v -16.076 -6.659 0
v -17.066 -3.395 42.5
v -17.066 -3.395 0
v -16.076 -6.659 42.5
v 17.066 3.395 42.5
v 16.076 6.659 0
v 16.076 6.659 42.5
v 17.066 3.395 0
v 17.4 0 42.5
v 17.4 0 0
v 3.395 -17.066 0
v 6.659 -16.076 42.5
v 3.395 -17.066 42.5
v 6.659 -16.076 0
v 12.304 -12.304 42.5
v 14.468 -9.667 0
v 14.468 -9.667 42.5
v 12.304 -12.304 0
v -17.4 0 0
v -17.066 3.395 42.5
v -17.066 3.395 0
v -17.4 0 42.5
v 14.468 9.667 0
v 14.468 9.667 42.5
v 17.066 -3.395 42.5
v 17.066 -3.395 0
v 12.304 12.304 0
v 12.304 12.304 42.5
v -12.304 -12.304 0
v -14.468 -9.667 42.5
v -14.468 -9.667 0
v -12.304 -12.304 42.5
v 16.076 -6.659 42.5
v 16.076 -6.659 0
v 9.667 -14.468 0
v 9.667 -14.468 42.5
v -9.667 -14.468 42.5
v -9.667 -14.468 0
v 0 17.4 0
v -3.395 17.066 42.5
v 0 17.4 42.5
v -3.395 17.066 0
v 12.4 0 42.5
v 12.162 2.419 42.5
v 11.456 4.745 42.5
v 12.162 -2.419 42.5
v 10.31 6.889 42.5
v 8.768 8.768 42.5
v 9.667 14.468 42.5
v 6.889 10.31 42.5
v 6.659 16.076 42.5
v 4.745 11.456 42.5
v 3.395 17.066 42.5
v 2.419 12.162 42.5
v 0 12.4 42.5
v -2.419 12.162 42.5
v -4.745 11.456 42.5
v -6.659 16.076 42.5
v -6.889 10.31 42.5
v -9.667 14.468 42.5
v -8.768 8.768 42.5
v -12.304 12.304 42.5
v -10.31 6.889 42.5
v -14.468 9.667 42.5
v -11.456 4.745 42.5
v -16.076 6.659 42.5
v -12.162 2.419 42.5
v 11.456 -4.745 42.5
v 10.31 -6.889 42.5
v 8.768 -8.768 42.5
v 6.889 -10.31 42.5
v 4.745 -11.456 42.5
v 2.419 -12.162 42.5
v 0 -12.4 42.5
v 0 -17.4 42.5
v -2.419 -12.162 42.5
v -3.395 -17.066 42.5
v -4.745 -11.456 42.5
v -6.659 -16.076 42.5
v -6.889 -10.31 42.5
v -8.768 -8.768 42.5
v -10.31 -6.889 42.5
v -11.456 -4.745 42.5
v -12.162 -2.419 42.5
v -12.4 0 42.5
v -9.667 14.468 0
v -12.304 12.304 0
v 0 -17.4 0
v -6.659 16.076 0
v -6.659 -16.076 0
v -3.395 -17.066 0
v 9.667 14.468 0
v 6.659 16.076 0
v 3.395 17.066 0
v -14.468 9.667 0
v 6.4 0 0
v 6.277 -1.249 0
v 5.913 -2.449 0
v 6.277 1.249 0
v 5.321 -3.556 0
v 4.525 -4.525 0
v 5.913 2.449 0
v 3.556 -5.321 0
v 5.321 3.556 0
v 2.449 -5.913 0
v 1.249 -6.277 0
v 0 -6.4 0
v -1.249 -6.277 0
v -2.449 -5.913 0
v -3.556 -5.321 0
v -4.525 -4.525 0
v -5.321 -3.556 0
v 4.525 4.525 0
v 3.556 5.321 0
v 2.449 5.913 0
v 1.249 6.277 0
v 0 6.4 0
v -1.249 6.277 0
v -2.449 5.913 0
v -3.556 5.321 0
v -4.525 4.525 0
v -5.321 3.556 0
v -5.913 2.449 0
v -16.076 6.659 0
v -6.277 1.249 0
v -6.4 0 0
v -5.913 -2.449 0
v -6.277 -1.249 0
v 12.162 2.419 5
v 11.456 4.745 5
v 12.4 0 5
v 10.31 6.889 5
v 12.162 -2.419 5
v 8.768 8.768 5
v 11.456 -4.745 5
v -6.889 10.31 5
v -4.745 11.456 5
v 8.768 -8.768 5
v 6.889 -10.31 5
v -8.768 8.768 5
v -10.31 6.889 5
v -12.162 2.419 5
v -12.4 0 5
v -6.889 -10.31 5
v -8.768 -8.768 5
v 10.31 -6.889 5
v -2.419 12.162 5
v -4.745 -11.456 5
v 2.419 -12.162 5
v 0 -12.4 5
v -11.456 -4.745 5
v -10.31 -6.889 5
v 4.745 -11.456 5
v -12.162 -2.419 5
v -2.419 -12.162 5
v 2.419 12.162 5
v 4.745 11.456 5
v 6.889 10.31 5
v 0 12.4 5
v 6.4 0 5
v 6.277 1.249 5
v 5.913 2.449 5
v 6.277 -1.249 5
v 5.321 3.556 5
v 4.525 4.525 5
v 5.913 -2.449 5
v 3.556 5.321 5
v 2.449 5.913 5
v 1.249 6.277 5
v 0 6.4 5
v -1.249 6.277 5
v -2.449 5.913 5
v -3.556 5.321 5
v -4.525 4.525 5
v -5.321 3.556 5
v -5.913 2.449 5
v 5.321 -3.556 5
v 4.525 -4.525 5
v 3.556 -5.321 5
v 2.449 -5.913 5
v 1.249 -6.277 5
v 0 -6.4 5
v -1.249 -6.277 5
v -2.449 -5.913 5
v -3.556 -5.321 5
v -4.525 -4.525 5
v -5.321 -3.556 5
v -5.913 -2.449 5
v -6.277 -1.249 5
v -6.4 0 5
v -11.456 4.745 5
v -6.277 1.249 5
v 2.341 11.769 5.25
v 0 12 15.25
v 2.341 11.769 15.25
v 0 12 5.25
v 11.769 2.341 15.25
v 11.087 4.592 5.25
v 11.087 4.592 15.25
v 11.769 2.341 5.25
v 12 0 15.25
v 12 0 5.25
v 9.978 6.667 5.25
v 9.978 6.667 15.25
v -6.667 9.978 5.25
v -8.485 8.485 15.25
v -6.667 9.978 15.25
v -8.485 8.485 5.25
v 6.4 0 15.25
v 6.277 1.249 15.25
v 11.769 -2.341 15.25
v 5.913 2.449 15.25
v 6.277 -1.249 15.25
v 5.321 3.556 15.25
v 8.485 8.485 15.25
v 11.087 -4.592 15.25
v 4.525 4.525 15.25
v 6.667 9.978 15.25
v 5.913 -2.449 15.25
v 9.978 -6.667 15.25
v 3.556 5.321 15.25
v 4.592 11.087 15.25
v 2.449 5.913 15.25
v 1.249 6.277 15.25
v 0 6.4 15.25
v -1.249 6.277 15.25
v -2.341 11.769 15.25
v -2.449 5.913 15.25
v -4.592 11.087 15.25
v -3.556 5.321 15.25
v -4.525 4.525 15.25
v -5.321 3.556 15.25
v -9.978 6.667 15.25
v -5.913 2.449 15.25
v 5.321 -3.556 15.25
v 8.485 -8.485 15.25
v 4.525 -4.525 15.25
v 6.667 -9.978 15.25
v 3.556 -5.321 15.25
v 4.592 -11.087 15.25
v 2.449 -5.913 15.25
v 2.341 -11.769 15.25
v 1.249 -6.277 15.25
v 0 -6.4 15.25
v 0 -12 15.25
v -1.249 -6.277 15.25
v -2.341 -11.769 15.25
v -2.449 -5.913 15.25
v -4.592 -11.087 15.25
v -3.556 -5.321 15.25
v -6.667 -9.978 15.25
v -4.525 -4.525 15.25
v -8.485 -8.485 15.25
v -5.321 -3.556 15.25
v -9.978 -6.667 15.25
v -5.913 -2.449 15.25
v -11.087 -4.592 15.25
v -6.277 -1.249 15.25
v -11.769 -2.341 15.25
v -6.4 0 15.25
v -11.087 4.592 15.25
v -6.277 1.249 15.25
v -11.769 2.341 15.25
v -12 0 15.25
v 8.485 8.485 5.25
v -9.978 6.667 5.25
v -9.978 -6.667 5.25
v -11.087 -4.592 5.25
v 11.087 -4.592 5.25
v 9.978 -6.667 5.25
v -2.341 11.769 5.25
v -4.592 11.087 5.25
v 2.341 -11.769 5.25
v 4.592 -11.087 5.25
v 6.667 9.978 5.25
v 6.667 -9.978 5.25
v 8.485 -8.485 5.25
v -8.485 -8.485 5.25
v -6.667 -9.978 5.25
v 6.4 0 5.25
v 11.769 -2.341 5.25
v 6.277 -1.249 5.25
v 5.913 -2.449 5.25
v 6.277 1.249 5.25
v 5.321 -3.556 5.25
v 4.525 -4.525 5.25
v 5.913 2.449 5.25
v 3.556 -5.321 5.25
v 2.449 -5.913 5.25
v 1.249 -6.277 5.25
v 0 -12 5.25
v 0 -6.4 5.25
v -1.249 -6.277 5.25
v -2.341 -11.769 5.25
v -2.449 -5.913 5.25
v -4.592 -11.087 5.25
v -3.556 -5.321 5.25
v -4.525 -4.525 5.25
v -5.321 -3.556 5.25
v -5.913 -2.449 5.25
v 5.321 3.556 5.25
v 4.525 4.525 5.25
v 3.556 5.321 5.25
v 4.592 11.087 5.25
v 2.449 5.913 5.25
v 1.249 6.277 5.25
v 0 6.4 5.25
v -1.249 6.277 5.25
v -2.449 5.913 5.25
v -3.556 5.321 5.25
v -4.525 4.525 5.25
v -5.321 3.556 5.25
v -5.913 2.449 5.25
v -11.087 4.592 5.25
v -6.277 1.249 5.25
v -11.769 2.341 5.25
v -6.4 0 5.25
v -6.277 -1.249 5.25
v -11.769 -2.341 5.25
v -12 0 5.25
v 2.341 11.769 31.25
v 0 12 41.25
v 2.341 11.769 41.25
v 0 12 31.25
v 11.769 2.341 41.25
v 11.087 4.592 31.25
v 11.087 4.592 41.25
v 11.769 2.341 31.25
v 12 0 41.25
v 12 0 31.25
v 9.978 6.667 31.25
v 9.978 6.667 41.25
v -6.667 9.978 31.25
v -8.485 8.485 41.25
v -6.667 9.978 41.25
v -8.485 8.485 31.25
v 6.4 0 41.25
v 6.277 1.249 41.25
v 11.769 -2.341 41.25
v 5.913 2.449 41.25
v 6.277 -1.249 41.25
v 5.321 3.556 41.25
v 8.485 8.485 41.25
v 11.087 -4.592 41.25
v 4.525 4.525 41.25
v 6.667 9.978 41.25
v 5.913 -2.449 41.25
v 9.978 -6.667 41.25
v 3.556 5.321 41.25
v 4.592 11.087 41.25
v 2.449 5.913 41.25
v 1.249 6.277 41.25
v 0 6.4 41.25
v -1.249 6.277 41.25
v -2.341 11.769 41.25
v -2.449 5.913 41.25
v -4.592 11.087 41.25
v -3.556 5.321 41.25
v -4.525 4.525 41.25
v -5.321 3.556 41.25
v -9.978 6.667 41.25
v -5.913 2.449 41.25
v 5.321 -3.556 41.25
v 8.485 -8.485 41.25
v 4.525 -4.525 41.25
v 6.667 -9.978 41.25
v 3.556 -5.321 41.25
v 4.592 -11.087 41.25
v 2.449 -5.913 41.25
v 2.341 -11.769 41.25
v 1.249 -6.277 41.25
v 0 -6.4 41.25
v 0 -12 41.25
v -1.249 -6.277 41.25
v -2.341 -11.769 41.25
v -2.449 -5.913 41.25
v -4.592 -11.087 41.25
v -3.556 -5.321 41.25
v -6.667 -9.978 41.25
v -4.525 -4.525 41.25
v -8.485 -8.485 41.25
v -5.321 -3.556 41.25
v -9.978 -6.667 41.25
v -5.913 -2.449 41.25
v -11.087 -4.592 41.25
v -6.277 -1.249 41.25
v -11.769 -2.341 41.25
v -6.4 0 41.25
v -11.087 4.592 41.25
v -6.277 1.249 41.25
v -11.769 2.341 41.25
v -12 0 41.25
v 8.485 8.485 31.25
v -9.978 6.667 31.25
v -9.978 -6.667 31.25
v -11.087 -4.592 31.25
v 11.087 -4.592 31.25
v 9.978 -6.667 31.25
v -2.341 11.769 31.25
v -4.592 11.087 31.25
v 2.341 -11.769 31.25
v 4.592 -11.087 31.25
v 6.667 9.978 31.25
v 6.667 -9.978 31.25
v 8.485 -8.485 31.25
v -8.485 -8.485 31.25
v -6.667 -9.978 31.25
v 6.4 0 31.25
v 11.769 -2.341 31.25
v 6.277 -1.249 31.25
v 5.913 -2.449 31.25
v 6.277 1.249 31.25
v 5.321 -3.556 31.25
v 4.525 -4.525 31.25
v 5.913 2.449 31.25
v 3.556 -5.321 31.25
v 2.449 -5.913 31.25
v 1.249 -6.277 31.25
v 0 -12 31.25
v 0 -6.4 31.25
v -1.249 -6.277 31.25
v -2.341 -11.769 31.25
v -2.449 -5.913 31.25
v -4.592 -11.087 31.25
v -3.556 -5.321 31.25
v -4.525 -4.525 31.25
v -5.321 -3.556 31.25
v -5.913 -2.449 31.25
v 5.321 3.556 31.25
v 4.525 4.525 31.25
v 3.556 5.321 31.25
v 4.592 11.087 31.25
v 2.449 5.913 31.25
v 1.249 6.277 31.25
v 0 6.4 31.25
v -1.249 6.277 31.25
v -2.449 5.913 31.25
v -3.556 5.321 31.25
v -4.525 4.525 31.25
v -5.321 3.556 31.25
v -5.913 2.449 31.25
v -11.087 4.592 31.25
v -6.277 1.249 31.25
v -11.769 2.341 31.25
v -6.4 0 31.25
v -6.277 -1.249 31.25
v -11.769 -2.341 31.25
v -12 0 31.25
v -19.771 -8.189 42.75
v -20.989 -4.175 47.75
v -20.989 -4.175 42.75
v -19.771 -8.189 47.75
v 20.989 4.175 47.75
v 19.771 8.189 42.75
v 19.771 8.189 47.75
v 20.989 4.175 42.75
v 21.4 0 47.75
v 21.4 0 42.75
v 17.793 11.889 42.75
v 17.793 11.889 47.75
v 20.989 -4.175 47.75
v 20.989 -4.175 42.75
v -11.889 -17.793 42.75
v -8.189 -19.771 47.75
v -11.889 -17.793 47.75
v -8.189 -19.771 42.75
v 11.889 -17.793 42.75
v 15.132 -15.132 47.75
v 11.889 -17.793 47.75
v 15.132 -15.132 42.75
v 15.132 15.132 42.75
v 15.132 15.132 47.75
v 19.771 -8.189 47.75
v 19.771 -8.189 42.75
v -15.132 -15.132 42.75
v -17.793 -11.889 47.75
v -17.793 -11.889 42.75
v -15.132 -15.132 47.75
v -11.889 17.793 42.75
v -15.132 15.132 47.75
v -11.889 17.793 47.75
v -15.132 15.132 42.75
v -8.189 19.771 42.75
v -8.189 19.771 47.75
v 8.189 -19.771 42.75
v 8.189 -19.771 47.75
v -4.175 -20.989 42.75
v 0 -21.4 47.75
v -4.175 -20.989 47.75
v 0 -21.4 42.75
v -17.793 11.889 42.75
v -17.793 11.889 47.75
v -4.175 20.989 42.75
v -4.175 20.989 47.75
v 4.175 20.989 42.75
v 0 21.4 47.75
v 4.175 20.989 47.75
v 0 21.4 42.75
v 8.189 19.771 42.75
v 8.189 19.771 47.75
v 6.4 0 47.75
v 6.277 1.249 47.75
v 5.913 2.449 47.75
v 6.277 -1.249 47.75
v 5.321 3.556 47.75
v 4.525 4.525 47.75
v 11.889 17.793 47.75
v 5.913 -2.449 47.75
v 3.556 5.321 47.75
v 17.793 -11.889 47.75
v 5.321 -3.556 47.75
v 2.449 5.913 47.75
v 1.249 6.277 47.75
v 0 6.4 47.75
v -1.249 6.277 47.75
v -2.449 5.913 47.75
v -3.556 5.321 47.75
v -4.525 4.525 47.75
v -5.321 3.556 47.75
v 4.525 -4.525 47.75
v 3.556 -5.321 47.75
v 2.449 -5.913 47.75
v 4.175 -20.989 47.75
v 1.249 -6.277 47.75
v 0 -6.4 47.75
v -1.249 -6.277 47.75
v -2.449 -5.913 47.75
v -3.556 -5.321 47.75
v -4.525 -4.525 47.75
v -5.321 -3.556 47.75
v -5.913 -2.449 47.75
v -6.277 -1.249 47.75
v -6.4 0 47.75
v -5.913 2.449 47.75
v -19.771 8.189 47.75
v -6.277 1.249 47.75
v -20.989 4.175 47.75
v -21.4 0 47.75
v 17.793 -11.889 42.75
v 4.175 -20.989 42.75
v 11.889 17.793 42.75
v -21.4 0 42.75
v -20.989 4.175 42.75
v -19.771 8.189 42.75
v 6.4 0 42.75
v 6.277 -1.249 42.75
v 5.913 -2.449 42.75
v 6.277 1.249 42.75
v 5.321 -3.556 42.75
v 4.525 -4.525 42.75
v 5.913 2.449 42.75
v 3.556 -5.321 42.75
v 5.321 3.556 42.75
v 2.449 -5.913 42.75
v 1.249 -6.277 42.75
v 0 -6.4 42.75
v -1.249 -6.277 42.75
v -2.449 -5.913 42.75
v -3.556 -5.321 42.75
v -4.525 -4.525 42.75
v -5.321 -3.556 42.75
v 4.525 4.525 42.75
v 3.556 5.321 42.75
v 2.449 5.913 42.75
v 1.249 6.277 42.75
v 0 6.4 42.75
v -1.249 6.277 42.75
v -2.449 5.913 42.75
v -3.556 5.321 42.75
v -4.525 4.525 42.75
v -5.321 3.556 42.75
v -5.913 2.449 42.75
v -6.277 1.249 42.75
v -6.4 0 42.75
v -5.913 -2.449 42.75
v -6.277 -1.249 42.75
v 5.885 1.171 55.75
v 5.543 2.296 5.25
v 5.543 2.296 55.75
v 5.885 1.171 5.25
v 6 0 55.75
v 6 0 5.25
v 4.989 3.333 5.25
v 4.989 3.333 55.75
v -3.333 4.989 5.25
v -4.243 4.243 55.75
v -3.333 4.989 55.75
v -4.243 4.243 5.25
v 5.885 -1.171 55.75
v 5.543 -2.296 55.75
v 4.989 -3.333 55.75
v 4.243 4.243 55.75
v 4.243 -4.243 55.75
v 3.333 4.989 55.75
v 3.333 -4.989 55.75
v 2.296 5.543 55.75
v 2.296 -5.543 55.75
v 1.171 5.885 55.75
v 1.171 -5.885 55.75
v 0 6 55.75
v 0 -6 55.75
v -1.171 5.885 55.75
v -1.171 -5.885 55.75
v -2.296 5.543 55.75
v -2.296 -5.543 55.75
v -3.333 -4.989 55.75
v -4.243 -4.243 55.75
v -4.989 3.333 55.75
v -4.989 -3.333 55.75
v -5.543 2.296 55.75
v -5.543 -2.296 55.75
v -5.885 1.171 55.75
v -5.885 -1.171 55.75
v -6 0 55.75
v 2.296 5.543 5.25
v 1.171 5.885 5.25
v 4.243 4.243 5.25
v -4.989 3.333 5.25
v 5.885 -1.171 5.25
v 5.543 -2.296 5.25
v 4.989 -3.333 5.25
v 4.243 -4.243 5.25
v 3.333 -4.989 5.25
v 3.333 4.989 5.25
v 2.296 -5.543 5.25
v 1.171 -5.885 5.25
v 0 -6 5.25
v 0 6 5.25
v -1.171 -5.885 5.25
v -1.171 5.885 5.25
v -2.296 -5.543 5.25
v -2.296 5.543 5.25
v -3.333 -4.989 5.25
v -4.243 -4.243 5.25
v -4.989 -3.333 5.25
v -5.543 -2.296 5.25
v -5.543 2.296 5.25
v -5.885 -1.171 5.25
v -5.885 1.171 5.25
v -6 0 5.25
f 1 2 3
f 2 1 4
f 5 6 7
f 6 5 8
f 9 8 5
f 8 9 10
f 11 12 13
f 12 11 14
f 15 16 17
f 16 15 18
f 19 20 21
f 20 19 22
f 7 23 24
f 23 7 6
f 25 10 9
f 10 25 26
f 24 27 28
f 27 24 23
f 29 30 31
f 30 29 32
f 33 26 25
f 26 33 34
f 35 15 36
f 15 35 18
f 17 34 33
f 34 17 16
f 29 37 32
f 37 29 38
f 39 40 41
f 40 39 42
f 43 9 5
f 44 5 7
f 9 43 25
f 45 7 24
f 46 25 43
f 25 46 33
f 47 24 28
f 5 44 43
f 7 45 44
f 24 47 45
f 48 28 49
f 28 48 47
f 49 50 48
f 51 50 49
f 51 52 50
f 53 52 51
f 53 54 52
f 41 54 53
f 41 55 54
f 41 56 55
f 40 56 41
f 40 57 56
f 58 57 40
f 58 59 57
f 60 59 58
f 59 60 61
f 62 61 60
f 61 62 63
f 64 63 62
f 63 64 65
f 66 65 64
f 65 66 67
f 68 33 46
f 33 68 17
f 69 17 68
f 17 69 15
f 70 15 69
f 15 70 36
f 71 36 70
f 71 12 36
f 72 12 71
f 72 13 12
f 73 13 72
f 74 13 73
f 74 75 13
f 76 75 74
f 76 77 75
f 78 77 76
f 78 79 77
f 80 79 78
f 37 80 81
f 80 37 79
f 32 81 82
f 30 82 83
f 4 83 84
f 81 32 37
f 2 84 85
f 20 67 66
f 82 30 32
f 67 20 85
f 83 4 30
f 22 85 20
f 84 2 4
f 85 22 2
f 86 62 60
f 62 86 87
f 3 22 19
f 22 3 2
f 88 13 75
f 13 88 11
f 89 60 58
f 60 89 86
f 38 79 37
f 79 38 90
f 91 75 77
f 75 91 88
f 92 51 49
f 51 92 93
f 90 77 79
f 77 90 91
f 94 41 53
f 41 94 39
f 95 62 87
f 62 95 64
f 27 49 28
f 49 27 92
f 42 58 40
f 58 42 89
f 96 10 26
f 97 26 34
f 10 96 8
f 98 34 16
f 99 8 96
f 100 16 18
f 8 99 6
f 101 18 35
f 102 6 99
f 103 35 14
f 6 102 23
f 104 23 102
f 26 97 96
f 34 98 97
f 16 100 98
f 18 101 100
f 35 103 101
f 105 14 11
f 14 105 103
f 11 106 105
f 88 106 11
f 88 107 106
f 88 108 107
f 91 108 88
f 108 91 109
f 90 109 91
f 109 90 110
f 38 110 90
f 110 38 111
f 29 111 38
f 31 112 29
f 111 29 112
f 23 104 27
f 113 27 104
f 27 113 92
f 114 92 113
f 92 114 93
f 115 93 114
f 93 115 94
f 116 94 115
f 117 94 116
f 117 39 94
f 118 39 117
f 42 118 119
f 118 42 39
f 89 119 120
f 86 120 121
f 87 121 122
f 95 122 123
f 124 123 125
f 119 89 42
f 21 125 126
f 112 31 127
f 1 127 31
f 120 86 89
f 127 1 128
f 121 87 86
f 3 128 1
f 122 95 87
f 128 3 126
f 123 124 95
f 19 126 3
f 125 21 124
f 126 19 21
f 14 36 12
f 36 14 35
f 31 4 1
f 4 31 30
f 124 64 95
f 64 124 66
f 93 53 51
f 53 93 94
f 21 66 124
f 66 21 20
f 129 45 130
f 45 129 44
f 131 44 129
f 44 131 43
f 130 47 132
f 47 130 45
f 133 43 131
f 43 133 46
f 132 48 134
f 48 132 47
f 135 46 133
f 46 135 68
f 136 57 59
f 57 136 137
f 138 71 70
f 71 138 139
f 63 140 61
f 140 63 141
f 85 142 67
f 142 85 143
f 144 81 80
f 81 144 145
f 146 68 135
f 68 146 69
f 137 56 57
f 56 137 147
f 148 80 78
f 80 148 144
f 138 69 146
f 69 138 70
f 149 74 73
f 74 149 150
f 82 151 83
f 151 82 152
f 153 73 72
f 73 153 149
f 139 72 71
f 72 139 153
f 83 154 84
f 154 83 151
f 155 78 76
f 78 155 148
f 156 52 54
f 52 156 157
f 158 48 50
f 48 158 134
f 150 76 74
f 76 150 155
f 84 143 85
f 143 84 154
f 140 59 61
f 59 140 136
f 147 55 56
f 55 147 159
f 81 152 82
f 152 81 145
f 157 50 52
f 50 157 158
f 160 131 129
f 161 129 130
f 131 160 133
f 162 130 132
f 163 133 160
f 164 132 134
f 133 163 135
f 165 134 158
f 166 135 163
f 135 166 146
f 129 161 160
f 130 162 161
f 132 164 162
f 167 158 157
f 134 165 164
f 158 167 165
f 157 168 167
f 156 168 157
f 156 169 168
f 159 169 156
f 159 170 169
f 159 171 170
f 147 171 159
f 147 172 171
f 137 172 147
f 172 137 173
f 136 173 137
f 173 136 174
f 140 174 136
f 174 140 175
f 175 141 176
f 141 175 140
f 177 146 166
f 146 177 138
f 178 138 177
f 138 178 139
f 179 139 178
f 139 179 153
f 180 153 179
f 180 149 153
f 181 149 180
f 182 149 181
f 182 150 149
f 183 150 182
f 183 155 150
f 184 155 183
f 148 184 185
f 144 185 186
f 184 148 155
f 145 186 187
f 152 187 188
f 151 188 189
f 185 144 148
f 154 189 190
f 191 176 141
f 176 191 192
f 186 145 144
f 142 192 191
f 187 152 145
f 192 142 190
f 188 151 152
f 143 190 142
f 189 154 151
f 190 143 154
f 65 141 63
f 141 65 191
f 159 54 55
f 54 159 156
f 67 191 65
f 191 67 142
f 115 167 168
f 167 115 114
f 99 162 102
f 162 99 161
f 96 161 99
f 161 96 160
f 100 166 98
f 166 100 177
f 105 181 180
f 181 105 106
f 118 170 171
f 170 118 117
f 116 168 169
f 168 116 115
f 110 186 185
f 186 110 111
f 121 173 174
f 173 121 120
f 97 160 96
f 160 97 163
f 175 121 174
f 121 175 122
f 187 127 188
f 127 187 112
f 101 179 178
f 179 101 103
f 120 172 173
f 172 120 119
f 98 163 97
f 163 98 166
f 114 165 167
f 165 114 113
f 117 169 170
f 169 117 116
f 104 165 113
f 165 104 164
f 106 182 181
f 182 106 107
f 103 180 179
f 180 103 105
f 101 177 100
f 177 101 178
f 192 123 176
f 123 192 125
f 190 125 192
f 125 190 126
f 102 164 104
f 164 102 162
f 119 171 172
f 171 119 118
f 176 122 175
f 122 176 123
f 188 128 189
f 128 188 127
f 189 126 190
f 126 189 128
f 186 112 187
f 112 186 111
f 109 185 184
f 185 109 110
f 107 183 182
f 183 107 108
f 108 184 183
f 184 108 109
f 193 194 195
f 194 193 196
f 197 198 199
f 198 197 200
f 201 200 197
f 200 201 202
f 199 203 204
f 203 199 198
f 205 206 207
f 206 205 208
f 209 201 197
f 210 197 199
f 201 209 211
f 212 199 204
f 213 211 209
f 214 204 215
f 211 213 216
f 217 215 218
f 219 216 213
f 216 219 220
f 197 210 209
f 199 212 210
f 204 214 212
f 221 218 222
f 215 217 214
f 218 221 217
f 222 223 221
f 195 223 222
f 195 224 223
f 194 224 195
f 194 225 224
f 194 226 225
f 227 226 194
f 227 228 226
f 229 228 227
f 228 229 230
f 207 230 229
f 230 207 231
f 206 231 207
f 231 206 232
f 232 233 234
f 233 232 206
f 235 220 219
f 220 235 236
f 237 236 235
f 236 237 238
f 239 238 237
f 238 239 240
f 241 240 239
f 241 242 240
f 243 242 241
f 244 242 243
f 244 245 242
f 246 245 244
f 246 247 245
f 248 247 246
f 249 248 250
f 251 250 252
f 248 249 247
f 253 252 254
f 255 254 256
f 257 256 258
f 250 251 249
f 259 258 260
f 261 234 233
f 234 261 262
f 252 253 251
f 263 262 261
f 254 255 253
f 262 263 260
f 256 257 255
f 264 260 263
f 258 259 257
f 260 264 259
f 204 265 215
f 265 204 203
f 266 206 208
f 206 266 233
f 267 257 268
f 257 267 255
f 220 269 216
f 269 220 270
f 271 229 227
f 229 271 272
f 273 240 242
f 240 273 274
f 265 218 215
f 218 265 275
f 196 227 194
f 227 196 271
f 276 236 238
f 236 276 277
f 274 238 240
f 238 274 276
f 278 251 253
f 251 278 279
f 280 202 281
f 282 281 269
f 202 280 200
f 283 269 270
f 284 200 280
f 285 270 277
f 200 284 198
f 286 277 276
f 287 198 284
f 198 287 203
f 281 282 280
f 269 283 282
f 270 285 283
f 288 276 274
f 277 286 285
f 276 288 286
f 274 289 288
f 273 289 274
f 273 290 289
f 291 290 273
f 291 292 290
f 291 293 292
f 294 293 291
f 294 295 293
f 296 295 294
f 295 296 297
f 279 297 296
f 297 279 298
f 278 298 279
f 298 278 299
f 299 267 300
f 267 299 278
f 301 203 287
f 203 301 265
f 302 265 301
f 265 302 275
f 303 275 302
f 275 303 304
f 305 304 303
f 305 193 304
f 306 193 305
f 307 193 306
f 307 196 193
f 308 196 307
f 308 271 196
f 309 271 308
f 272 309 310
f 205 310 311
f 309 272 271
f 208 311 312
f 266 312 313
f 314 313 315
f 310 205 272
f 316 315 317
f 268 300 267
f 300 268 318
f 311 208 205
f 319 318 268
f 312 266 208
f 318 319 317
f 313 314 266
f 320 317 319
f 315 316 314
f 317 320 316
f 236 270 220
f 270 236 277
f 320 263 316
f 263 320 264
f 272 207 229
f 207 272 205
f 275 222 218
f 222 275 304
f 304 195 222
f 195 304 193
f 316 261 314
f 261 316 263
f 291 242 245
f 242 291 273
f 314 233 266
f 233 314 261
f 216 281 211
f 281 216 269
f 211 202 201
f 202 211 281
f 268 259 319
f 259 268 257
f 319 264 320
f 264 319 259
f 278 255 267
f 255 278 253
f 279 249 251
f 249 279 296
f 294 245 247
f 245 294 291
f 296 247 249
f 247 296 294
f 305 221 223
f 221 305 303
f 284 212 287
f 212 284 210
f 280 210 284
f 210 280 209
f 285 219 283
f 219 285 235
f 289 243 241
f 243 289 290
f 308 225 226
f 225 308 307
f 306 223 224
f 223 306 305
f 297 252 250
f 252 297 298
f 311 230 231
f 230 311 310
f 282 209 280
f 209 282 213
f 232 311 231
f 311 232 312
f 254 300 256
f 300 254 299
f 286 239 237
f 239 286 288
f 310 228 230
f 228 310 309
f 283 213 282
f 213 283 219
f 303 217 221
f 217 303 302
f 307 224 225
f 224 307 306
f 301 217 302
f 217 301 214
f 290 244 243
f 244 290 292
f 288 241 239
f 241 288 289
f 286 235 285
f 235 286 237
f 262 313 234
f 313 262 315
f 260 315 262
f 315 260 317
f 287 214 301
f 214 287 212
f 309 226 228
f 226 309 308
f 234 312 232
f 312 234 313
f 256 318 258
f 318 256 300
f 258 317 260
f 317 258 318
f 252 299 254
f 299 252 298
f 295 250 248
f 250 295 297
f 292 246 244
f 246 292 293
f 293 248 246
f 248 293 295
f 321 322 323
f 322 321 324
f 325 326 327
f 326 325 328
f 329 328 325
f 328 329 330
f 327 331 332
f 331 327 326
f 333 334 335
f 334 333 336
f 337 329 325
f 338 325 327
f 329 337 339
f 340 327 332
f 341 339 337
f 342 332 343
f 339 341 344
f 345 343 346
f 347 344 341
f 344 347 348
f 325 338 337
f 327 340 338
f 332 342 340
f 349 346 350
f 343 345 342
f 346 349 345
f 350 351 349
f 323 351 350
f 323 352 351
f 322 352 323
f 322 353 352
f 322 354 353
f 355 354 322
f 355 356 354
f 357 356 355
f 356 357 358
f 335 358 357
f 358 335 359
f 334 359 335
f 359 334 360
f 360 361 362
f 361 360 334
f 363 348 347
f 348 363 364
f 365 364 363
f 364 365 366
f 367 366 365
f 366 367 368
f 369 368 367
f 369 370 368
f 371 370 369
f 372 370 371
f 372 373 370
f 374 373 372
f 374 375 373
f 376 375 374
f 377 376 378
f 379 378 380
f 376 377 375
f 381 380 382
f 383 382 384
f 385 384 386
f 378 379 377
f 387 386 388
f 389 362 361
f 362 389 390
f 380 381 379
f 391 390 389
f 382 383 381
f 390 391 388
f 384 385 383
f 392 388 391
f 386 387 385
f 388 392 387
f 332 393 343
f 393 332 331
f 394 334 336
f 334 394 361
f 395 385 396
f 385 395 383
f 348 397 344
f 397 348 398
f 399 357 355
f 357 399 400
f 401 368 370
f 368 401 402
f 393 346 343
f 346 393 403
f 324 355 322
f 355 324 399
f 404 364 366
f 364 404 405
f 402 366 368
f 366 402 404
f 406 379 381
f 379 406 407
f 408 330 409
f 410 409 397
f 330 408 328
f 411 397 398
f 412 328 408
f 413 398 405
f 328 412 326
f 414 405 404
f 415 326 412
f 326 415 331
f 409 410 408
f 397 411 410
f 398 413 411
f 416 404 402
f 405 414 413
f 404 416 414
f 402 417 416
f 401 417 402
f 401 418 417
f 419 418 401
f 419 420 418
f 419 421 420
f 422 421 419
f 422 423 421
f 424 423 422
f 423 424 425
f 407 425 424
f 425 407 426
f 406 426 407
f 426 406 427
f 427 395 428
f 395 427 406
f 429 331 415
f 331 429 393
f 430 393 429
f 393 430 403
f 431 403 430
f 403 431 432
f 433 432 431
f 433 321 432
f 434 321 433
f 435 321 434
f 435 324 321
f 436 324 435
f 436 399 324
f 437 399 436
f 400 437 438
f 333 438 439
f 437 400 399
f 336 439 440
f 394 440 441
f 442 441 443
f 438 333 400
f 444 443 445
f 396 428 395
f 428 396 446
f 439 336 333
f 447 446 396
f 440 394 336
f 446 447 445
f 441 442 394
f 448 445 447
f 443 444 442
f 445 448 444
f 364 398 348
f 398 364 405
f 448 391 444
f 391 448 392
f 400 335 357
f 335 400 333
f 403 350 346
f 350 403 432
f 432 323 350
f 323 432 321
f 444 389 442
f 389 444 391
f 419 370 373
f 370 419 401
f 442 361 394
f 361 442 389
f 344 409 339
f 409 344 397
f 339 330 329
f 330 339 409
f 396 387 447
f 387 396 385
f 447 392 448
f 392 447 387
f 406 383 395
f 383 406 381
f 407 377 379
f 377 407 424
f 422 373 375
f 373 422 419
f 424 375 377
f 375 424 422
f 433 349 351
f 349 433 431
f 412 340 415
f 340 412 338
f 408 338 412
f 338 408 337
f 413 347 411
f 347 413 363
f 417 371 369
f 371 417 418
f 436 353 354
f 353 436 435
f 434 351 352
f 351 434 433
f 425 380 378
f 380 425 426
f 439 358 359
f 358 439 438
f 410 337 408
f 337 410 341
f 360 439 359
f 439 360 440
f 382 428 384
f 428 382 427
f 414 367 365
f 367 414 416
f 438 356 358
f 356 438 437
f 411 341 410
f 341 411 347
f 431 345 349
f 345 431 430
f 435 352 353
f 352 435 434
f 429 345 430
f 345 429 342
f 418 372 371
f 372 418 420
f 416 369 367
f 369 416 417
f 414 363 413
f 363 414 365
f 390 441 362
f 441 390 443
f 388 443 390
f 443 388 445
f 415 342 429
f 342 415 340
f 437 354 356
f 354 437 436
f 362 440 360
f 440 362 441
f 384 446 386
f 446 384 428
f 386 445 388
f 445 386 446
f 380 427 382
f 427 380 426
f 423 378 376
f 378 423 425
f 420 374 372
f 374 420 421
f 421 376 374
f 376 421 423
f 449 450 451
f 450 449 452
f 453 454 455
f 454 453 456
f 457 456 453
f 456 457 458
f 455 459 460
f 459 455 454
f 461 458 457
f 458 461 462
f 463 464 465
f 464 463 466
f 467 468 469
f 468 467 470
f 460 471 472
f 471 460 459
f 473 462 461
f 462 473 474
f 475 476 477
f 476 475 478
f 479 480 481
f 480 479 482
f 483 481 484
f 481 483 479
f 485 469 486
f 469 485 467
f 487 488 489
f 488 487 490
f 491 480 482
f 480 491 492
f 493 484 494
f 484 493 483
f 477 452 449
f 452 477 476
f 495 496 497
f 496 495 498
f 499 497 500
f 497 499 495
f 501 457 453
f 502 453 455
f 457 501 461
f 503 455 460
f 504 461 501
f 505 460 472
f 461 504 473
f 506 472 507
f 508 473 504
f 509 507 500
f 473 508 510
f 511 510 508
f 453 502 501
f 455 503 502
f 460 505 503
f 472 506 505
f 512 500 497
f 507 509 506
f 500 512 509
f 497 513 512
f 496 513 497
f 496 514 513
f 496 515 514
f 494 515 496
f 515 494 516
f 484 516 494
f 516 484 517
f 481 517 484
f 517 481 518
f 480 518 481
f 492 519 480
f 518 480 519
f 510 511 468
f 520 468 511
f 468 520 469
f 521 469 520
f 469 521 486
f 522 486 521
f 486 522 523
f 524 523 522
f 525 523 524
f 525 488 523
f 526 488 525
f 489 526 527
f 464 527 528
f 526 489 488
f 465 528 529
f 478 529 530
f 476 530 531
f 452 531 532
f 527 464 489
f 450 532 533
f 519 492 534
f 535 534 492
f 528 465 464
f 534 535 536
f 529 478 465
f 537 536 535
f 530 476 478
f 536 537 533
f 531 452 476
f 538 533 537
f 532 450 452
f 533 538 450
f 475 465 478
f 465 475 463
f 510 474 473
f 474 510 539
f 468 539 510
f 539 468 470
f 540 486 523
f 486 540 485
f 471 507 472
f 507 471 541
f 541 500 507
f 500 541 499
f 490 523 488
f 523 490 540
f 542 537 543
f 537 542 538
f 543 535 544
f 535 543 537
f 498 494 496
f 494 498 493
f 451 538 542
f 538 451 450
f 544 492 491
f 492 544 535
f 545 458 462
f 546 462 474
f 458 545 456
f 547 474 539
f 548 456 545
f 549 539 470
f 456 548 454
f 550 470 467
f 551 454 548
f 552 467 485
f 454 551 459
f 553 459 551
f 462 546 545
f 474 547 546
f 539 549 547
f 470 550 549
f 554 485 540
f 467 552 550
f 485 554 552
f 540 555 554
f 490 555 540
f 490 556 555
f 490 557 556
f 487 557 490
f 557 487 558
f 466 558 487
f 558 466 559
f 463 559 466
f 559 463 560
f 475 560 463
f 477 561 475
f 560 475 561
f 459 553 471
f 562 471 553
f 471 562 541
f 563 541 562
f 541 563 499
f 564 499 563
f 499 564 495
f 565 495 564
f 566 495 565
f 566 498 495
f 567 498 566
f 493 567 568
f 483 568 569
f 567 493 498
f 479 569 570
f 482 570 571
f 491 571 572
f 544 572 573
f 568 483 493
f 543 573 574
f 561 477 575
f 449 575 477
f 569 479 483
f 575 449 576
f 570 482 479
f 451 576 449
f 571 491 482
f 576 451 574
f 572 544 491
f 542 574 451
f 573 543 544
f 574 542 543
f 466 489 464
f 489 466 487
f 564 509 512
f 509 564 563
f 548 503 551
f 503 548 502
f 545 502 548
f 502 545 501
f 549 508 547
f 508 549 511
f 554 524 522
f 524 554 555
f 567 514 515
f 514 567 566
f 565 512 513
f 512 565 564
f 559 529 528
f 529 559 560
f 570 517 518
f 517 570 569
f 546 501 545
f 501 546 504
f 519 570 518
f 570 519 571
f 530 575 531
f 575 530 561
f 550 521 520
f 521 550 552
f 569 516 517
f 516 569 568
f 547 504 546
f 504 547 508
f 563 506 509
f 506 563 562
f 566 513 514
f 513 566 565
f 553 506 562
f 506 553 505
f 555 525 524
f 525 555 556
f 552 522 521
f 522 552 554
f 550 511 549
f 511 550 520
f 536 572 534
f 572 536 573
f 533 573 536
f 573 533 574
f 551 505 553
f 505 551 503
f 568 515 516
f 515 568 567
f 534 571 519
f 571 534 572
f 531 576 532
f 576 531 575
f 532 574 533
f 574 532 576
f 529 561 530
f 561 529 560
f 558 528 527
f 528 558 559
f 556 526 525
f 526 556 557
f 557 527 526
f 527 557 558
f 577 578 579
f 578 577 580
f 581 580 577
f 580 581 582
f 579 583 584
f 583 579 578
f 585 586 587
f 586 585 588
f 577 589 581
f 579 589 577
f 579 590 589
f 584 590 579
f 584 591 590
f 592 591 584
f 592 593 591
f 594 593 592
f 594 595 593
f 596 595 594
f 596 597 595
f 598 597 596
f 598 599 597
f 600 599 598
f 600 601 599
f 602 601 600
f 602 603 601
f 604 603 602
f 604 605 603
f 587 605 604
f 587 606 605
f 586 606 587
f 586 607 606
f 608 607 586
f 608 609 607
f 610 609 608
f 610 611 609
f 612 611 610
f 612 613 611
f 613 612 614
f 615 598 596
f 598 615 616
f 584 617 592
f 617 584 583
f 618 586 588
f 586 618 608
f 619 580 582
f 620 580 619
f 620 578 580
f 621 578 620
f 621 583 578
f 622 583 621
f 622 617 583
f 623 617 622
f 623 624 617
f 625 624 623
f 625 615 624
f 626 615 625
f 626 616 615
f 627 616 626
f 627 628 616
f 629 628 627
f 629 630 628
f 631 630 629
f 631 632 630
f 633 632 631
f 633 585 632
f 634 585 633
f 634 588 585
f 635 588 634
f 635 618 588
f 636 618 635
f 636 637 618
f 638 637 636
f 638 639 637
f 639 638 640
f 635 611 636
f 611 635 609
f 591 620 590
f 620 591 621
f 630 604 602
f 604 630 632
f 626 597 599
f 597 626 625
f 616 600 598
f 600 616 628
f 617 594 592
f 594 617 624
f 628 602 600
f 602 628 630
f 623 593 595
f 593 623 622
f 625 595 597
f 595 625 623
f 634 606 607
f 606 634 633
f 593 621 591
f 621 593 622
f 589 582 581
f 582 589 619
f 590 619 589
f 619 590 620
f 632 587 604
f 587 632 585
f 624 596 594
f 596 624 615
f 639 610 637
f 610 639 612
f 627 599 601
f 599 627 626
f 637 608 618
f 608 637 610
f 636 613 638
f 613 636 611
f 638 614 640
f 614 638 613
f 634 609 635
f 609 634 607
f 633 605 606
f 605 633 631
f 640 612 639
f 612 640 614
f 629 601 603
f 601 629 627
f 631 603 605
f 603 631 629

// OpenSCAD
$fn = 32;

// ------------------------------------------------------------------------
// Shaft station: cup d34.8 x 42.5 mm, shaft d12
// Every part is its own module, assembly() places every instance.
// ------------------------------------------------------------------------

// --- part 1 ---
module housing_cup() {
  difference() {
    cylinder(h = 42.5, d = 34.8);
    translate([0, 0, 5]) cylinder(h = 38.5, d = 24.8);
    translate([0, 0, -1]) cylinder(h = 7, d = 12.8);
  }
}

// --- part 2 ---
module bearing_lower() {
  difference() {
      translate([0, 0, 0]) cylinder(h = 10, d = 24);
      translate([0, 0, -1]) cylinder(h = 12, d = 12.8);
    }
}

// --- part 3 ---
module bearing_upper() {
  difference() {
      translate([0, 0, 0]) cylinder(h = 10, d = 24);
      translate([0, 0, -1]) cylinder(h = 12, d = 12.8);
    }
}

// --- part 4 ---
module station_shaft() {
  translate([0, 0, -25.25]) cylinder(h = 50.5, d = 12);
}

// --- part 5 ---
module station_cover() {
  difference() {
    cylinder(h = 5, d = 42.8);
    translate([0, 0, -1]) cylinder(h = 7, d = 12.8);
  }
}

// --- assembly ---
module assembly() {
  color([0.80, 0.24, 0.20]) translate([0, 0, 0]) rotate([0, 0, 0]) housing_cup();
  color([0.20, 0.45, 0.75]) translate([0, 0, 5.25]) rotate([0, 0, 0]) bearing_lower();
  color([0.25, 0.62, 0.32]) translate([0, 0, 31.25]) rotate([0, 0, 0]) bearing_upper();
  color([0.92, 0.70, 0.18]) translate([0, 0, 30.5]) rotate([0, 0, 0]) station_shaft();
  color([0.58, 0.35, 0.70]) translate([0, 0, 42.75]) rotate([0, 0, 0]) station_cover();
}

assembly();
